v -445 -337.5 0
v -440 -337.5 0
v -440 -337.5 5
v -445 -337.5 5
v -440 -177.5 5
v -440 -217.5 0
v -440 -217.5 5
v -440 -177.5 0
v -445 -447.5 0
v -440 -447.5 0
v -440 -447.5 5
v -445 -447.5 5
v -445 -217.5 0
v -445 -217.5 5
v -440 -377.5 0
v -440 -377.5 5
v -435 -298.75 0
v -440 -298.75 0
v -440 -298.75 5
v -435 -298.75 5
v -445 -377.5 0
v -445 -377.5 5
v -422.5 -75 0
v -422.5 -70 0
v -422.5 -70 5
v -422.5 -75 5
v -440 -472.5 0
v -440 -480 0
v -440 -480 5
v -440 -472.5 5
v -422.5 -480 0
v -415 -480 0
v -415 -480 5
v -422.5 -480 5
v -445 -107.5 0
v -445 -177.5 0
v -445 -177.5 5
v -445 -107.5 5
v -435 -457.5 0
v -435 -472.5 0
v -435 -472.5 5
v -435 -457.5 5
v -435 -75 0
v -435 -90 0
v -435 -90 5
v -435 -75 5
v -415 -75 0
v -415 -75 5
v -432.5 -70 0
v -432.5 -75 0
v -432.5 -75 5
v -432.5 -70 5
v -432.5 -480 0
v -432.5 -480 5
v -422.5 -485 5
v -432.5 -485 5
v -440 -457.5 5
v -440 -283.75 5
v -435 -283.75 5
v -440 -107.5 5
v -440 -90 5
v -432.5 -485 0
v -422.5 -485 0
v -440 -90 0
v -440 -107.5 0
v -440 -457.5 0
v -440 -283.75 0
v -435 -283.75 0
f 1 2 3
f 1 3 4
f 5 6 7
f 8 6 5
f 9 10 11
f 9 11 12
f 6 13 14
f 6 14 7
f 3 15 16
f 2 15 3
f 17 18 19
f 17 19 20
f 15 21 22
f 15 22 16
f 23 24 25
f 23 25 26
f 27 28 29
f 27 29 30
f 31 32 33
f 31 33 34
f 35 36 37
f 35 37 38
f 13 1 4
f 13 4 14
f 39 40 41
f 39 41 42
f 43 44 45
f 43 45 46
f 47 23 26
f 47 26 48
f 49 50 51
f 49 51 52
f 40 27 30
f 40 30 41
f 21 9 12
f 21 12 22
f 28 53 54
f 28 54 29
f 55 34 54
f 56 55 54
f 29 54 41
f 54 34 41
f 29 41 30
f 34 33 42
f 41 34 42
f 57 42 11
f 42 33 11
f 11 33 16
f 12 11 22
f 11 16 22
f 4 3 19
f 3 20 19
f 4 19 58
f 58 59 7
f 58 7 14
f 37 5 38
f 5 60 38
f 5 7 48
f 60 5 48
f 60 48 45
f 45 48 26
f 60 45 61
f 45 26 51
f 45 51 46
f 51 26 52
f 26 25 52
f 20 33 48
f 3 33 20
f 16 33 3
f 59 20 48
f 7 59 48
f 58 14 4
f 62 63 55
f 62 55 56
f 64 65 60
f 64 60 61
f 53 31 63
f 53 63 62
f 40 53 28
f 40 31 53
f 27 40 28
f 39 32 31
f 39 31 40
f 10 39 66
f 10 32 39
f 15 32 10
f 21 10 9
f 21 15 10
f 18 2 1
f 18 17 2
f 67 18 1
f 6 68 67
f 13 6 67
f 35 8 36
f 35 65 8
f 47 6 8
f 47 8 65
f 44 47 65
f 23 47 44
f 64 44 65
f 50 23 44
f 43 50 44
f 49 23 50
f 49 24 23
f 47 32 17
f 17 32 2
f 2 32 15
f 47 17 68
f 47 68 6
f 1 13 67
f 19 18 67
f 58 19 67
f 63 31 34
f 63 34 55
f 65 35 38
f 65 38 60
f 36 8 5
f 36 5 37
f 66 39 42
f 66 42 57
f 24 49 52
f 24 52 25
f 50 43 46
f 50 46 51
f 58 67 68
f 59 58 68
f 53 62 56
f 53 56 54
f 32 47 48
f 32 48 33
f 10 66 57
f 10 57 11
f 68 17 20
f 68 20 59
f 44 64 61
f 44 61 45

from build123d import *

# Parameters (mm, degrees)
SKETCH1_W           = 5
SKETCH1_H           = 15
BOSS_EXTRUDE1_DEPTH = 5


with BuildPart() as part:
    # Sketch1 → Boss-Extrude1 (new body)
    with BuildSketch(Plane.XY):
        Polygon((-440, -217.5), (-440, -177.5), (-445, -177.5), (-445, -107.5), (-440, -107.5), (-440, -90), (-435, -90), (-435, -75), (-432.5, -75), (-432.5, -70), (-422.5, -70), (-422.5, -75), (-415, -75), (-415, -480), (-422.5, -480), (-422.5, -485), (-432.5, -485), (-432.5, -480), (-440, -480), (-440, -472.5), (-435, -472.5), (-435, -457.5), (-440, -457.5), (-440, -447.5), (-445, -447.5), (-445, -377.5), (-440, -377.5), (-440, -337.5), (-445, -337.5), (-445, -217.5), align=None)
        with Locations((-437.5, -291.25)):
            Rectangle(SKETCH1_W, SKETCH1_H, mode=Mode.SUBTRACT)
    extrude(amount=BOSS_EXTRUDE1_DEPTH)


solid = part.part
